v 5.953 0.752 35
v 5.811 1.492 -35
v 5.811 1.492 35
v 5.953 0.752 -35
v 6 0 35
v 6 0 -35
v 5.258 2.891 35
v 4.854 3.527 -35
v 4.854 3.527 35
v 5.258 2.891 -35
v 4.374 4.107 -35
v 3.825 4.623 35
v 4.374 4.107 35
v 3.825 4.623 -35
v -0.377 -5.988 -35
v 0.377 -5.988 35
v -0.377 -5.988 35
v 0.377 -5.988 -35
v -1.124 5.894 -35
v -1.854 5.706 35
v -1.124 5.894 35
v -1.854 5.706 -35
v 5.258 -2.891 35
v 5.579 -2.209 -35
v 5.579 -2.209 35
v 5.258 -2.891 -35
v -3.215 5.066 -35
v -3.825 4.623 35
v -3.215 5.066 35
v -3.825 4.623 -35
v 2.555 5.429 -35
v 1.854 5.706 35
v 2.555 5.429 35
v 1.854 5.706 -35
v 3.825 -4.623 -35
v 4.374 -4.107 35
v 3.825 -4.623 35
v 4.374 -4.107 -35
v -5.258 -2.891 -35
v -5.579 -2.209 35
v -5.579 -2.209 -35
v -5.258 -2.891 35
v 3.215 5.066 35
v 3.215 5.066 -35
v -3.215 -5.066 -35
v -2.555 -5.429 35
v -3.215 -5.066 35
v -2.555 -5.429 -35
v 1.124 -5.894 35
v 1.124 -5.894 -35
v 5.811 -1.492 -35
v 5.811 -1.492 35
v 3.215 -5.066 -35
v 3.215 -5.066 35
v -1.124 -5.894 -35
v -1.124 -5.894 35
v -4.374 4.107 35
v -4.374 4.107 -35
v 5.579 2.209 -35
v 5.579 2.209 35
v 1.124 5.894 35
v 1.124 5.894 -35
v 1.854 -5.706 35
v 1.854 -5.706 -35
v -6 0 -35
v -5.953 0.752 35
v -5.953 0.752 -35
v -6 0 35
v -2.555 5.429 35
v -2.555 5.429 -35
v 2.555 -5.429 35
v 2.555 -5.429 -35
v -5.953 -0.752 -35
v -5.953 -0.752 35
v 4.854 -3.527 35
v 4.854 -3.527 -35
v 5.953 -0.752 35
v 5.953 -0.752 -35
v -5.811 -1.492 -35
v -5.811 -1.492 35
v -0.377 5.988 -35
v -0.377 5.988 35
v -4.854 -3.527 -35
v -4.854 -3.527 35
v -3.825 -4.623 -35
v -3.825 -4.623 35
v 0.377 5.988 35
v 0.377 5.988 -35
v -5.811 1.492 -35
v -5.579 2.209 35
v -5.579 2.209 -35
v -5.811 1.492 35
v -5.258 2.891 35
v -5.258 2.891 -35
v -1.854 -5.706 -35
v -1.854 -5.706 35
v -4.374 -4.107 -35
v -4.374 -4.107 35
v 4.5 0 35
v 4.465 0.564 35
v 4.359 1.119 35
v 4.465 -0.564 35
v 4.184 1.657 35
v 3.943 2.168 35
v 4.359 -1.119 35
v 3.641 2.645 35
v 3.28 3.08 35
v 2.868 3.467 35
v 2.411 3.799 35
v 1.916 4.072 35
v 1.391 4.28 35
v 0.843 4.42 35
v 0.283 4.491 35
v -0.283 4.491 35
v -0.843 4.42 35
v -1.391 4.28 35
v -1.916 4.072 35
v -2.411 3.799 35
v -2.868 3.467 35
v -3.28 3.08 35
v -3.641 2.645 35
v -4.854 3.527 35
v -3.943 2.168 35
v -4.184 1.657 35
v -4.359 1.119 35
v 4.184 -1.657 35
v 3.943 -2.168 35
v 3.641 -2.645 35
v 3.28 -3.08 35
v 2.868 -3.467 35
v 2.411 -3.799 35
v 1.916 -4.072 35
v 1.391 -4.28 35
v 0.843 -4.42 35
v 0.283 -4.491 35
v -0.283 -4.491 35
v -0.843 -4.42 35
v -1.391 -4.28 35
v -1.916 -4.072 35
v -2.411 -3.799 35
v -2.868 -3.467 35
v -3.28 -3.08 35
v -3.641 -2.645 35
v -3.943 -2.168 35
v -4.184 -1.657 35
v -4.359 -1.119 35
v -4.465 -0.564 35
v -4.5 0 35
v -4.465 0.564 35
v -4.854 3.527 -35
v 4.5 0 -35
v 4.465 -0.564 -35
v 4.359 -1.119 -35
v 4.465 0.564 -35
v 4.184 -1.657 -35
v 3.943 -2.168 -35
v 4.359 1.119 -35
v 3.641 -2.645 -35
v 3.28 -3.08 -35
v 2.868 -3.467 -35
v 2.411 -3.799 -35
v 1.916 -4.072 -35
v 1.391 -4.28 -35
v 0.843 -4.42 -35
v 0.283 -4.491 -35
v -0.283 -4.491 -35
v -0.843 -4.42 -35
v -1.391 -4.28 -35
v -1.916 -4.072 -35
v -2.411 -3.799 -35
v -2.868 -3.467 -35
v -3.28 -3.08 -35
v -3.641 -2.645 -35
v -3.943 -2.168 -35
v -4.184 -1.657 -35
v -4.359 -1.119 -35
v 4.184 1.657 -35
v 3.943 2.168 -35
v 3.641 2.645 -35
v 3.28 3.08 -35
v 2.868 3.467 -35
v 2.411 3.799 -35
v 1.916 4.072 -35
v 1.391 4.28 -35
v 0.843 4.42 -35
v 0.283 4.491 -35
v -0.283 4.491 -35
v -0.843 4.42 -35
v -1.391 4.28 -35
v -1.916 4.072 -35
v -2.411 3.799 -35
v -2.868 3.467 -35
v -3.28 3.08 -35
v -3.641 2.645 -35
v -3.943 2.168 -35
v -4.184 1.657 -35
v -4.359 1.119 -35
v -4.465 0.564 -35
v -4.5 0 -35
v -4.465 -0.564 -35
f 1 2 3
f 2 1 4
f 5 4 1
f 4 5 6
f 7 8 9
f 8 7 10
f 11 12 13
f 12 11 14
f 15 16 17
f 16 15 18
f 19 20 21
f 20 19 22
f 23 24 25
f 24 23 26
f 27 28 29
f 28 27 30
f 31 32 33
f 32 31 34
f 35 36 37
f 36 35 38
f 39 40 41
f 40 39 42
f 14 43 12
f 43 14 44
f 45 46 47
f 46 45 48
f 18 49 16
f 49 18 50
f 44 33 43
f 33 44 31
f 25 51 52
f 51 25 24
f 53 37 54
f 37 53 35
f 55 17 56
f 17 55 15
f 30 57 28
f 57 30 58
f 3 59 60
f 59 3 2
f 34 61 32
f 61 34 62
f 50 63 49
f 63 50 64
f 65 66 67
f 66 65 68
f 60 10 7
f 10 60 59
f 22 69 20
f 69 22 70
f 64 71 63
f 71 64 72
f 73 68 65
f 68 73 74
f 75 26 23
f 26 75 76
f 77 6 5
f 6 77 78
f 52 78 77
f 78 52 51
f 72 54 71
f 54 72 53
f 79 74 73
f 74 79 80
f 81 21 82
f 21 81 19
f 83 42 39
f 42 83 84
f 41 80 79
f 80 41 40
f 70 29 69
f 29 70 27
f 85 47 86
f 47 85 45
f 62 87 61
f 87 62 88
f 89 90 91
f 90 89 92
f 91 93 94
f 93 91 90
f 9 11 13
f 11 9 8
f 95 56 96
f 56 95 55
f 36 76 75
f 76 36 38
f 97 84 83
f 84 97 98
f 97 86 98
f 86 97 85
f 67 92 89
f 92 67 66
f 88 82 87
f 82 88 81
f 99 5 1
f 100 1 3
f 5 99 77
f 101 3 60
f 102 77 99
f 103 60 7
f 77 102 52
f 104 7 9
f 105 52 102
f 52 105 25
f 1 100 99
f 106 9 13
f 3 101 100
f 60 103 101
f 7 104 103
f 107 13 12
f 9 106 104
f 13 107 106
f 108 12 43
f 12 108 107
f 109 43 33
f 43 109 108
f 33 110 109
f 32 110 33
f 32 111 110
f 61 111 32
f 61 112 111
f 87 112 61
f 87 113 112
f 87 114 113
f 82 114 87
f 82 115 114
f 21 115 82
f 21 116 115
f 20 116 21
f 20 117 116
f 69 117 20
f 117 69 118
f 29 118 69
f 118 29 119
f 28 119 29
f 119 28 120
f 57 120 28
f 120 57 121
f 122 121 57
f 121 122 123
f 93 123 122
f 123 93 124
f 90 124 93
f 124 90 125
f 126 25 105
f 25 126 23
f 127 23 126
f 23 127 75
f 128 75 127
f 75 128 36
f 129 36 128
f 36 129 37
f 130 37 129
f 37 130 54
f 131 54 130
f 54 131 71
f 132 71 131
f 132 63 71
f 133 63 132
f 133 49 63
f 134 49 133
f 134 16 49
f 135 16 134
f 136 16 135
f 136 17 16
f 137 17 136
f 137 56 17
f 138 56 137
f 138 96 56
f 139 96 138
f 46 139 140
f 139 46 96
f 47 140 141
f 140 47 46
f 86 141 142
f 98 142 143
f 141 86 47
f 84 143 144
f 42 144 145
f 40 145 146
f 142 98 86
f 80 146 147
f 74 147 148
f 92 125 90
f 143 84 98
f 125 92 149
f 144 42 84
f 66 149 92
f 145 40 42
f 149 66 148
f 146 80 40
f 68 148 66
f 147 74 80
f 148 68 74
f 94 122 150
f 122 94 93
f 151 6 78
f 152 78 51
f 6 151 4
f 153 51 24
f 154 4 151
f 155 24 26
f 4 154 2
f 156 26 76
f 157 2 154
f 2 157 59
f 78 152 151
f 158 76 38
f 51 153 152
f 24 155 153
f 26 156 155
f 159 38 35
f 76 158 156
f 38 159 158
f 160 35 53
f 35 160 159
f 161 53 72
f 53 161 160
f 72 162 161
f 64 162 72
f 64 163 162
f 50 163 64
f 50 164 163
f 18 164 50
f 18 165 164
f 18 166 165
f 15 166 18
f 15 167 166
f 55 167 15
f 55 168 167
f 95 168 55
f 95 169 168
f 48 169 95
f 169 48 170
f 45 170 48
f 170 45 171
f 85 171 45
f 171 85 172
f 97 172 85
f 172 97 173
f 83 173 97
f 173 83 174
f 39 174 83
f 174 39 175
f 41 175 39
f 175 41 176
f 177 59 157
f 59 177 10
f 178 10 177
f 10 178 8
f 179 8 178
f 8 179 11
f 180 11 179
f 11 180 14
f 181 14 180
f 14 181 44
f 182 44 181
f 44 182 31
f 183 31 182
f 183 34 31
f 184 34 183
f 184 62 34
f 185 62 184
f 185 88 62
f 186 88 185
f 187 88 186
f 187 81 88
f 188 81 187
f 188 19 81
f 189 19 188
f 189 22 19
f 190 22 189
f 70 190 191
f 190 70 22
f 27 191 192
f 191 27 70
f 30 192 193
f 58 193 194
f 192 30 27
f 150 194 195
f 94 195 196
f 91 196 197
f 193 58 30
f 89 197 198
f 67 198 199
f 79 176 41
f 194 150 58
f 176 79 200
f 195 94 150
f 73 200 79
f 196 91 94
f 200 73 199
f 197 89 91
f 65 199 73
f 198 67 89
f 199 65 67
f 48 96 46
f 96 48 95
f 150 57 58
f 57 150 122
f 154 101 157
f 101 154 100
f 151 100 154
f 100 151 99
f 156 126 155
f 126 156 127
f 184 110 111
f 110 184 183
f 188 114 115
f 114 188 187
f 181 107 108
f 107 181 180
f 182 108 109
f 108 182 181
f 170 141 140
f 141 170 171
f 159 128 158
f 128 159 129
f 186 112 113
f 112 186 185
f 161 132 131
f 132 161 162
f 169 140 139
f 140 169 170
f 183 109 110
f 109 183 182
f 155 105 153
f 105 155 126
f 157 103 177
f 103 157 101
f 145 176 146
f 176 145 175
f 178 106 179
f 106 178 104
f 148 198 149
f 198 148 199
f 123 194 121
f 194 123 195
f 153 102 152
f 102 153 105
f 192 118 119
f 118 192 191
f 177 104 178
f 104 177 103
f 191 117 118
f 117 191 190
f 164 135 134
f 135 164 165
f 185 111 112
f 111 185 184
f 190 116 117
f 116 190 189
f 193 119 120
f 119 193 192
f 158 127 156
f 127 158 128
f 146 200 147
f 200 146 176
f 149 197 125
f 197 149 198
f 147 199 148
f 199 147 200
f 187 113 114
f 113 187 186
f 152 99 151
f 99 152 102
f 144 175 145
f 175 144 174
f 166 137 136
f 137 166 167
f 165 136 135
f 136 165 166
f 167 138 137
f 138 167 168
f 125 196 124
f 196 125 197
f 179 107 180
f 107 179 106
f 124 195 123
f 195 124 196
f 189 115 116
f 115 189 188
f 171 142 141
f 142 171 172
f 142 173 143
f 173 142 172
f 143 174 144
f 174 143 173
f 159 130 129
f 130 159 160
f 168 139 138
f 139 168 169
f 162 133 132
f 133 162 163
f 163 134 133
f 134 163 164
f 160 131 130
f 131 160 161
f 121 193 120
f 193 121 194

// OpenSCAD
$fn = 50;


difference() {
	union() {
		translate(v = [0, 0, -35.0000000000]) {
			cylinder(h = 70, r = 6.0000000000);
		}
	}
	union() {
		translate(v = [0, 0, -100.0000000000]) {
			cylinder(h = 200, r = 4.5000000000);
		}
	}
}
